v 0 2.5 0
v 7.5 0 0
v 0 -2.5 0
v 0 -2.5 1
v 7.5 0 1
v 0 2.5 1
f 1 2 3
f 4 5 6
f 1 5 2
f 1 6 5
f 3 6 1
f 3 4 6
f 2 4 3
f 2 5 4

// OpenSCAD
// dimensions (mm)
width = 5;
length = 7.5;
thick = 1;

linear_extrude(thick) {
    polygon(points = [[0,width/2],[length,0],[0,-width/2]]);
}
